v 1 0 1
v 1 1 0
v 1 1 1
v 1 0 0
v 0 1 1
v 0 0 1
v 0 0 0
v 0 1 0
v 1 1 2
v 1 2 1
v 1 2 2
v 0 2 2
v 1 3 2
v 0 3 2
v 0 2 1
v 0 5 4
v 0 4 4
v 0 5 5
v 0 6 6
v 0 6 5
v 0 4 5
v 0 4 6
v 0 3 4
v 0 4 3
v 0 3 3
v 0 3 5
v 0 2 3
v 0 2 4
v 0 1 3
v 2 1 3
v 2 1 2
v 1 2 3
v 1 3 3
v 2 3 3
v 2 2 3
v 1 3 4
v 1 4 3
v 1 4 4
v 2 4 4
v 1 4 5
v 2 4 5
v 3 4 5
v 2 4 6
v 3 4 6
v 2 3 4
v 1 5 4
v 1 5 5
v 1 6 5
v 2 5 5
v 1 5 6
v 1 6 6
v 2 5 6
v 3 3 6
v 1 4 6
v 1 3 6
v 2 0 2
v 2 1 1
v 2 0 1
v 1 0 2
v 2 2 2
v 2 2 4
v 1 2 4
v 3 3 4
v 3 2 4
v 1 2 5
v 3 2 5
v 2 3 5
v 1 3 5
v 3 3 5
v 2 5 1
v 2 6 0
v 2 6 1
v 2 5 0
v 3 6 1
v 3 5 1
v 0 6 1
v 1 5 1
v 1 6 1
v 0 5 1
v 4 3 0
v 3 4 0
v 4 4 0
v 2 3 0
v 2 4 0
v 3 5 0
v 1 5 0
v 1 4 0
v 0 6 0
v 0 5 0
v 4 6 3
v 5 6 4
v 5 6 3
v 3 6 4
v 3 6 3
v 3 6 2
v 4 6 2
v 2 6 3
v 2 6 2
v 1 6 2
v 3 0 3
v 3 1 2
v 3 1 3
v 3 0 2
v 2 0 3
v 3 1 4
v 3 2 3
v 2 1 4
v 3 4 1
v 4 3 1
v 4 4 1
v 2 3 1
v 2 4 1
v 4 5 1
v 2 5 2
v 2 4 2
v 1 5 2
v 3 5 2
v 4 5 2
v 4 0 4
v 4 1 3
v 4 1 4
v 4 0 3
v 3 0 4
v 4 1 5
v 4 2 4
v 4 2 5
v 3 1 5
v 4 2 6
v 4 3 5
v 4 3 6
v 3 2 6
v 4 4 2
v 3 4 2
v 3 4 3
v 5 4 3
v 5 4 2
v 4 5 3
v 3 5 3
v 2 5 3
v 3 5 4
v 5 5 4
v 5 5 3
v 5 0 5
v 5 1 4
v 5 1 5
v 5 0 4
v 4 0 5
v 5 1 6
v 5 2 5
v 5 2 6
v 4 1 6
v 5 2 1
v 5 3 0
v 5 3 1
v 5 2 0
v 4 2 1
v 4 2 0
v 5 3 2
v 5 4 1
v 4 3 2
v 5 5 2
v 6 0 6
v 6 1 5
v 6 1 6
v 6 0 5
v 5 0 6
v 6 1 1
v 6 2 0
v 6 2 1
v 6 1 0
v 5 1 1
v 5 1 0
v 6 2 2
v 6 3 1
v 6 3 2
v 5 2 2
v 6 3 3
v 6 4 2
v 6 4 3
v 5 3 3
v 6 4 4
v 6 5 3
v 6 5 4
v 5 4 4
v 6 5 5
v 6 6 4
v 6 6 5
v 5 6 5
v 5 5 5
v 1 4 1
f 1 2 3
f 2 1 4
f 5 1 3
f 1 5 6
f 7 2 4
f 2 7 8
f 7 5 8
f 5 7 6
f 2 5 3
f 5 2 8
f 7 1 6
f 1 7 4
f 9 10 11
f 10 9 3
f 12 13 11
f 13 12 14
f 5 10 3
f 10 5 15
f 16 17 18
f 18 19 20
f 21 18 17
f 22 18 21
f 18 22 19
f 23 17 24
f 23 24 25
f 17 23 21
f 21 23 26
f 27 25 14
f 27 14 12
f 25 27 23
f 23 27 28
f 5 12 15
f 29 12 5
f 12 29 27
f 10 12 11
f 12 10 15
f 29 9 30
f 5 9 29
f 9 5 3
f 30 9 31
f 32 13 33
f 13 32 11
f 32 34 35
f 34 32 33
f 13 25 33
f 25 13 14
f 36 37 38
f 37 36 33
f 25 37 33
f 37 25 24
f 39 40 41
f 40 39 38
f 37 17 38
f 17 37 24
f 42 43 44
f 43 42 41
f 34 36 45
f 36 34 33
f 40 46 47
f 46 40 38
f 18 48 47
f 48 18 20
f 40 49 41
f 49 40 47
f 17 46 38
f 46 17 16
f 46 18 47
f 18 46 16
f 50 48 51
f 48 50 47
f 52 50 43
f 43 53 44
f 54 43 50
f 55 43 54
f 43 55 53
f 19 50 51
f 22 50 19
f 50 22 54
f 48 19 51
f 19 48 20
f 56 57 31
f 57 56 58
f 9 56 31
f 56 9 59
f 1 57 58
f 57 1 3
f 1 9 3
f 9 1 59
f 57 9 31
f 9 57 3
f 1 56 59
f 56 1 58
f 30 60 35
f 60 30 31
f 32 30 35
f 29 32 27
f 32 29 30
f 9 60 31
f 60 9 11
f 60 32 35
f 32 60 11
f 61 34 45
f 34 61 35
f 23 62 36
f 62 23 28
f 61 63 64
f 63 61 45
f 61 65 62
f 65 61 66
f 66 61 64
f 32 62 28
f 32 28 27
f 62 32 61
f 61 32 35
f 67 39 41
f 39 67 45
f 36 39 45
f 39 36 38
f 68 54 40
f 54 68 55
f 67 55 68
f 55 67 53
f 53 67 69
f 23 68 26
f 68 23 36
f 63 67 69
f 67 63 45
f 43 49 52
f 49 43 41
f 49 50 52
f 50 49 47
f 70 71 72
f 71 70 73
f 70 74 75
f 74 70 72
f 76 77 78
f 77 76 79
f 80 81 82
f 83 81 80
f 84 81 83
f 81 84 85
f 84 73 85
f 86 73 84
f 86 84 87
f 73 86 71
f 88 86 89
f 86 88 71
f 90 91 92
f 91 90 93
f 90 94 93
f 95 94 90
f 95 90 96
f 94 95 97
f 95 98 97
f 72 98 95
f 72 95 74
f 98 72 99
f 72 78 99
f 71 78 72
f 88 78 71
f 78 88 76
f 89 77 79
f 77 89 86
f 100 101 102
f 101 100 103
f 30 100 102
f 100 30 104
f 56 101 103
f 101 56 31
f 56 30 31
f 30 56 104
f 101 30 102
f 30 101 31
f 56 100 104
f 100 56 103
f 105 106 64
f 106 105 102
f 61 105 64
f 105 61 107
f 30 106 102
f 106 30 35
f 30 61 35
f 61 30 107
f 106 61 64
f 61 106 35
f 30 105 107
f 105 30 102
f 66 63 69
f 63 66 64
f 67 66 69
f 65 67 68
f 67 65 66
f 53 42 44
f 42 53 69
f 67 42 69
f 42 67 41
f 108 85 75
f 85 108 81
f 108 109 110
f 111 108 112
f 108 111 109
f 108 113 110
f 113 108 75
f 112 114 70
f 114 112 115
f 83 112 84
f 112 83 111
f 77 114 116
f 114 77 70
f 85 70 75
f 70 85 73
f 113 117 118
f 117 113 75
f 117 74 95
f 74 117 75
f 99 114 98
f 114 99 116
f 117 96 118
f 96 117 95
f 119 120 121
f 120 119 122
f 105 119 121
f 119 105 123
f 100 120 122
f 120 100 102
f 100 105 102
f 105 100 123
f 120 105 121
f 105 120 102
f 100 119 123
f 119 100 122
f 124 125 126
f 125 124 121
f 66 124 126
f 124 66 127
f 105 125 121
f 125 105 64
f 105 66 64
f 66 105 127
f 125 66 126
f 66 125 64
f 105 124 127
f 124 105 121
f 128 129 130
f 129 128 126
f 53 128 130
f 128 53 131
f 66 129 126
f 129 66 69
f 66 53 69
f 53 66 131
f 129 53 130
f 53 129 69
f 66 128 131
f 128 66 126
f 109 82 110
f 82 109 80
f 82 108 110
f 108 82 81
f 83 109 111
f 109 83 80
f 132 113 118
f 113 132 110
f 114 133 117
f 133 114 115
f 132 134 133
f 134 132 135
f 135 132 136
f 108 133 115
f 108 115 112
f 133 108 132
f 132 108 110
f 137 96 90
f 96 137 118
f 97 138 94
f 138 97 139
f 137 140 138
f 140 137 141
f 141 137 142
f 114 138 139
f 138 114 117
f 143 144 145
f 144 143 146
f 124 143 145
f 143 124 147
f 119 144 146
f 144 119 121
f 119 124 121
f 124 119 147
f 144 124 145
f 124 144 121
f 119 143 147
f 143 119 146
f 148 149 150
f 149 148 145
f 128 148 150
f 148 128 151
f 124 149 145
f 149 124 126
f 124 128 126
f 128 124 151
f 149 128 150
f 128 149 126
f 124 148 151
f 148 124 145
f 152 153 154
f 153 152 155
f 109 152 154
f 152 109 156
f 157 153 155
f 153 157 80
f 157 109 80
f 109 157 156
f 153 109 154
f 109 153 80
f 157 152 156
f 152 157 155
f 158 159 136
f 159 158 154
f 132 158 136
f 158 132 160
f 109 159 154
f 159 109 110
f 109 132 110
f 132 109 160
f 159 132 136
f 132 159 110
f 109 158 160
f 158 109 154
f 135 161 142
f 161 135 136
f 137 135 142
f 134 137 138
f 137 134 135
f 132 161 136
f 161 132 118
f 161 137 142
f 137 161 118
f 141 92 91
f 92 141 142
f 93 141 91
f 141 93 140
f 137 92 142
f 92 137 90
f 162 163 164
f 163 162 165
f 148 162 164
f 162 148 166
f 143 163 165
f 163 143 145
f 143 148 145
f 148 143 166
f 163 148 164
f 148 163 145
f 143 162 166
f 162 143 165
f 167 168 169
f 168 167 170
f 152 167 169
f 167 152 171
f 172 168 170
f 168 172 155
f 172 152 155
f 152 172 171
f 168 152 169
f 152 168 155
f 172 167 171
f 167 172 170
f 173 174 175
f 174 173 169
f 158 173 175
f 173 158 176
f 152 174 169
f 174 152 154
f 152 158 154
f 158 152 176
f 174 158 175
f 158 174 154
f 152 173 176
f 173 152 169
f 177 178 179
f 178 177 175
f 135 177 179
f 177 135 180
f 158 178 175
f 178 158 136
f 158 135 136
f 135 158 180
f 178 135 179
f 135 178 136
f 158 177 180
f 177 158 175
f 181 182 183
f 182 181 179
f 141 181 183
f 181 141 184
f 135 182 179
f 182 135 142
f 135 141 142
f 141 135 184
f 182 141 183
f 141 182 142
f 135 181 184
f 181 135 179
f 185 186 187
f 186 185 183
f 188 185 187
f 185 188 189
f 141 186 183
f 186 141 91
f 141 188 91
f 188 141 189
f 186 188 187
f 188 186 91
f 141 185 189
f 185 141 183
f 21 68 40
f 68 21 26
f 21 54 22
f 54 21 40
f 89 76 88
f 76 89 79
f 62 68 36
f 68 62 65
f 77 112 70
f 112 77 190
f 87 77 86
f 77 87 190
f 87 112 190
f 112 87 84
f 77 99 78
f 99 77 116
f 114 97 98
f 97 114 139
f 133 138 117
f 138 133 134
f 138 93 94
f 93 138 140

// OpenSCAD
union() {
    translate([0.0, 0.0, 0.0]) cube([1, 1, 1]);
    translate([0.0, 1.0, 1.0]) cube([1, 1, 1]);
    translate([0.0, 2.0, 2.0]) cube([1, 1, 1]);
    translate([0.0, 3.0, 3.0]) cube([1, 1, 1]);
    translate([0.0, 4.0, 4.0]) cube([1, 1, 1]);
    translate([0.0, 5.0, 5.0]) cube([1, 1, 1]);
    translate([1.0, 0.0, 1.0]) cube([1, 1, 1]);
    translate([1.0, 1.0, 2.0]) cube([1, 1, 1]);
    translate([1.0, 2.0, 3.0]) cube([1, 1, 1]);
    translate([1.0, 3.0, 4.0]) cube([1, 1, 1]);
    translate([1.0, 4.0, 5.0]) cube([1, 1, 1]);
    translate([1.0, 5.0, 0.0]) cube([1, 1, 1]);
    translate([2.0, 0.0, 2.0]) cube([1, 1, 1]);
    translate([2.0, 1.0, 3.0]) cube([1, 1, 1]);
    translate([2.0, 2.0, 4.0]) cube([1, 1, 1]);
    translate([2.0, 3.0, 5.0]) cube([1, 1, 1]);
    translate([2.0, 4.0, 0.0]) cube([1, 1, 1]);
    translate([2.0, 5.0, 1.0]) cube([1, 1, 1]);
    translate([3.0, 0.0, 3.0]) cube([1, 1, 1]);
    translate([3.0, 1.0, 4.0]) cube([1, 1, 1]);
    translate([3.0, 2.0, 5.0]) cube([1, 1, 1]);
    translate([3.0, 3.0, 0.0]) cube([1, 1, 1]);
    translate([3.0, 4.0, 1.0]) cube([1, 1, 1]);
    translate([3.0, 5.0, 2.0]) cube([1, 1, 1]);
    translate([4.0, 0.0, 4.0]) cube([1, 1, 1]);
    translate([4.0, 1.0, 5.0]) cube([1, 1, 1]);
    translate([4.0, 2.0, 0.0]) cube([1, 1, 1]);
    translate([4.0, 3.0, 1.0]) cube([1, 1, 1]);
    translate([4.0, 4.0, 2.0]) cube([1, 1, 1]);
    translate([4.0, 5.0, 3.0]) cube([1, 1, 1]);
    translate([5.0, 0.0, 5.0]) cube([1, 1, 1]);
    translate([5.0, 1.0, 0.0]) cube([1, 1, 1]);
    translate([5.0, 2.0, 1.0]) cube([1, 1, 1]);
    translate([5.0, 3.0, 2.0]) cube([1, 1, 1]);
    translate([5.0, 4.0, 3.0]) cube([1, 1, 1]);
    translate([5.0, 5.0, 4.0]) cube([1, 1, 1]);
    translate([0.0, 1.0, 2.0]) cube([1, 1, 1]);
    translate([0.0, 2.0, 3.0]) cube([1, 1, 1]);
    translate([0.0, 3.0, 4.0]) cube([1, 1, 1]);
    translate([0.0, 4.0, 5.0]) cube([1, 1, 1]);
    translate([0.0, 5.0, 0.0]) cube([1, 1, 1]);
    translate([1.0, 2.0, 4.0]) cube([1, 1, 1]);
    translate([1.0, 3.0, 5.0]) cube([1, 1, 1]);
    translate([1.0, 4.0, 0.0]) cube([1, 1, 1]);
    translate([1.0, 5.0, 1.0]) cube([1, 1, 1]);
    translate([2.0, 3.0, 0.0]) cube([1, 1, 1]);
    translate([2.0, 4.0, 1.0]) cube([1, 1, 1]);
    translate([2.0, 5.0, 2.0]) cube([1, 1, 1]);
    translate([3.0, 4.0, 2.0]) cube([1, 1, 1]);
    translate([3.0, 5.0, 3.0]) cube([1, 1, 1]);
}
